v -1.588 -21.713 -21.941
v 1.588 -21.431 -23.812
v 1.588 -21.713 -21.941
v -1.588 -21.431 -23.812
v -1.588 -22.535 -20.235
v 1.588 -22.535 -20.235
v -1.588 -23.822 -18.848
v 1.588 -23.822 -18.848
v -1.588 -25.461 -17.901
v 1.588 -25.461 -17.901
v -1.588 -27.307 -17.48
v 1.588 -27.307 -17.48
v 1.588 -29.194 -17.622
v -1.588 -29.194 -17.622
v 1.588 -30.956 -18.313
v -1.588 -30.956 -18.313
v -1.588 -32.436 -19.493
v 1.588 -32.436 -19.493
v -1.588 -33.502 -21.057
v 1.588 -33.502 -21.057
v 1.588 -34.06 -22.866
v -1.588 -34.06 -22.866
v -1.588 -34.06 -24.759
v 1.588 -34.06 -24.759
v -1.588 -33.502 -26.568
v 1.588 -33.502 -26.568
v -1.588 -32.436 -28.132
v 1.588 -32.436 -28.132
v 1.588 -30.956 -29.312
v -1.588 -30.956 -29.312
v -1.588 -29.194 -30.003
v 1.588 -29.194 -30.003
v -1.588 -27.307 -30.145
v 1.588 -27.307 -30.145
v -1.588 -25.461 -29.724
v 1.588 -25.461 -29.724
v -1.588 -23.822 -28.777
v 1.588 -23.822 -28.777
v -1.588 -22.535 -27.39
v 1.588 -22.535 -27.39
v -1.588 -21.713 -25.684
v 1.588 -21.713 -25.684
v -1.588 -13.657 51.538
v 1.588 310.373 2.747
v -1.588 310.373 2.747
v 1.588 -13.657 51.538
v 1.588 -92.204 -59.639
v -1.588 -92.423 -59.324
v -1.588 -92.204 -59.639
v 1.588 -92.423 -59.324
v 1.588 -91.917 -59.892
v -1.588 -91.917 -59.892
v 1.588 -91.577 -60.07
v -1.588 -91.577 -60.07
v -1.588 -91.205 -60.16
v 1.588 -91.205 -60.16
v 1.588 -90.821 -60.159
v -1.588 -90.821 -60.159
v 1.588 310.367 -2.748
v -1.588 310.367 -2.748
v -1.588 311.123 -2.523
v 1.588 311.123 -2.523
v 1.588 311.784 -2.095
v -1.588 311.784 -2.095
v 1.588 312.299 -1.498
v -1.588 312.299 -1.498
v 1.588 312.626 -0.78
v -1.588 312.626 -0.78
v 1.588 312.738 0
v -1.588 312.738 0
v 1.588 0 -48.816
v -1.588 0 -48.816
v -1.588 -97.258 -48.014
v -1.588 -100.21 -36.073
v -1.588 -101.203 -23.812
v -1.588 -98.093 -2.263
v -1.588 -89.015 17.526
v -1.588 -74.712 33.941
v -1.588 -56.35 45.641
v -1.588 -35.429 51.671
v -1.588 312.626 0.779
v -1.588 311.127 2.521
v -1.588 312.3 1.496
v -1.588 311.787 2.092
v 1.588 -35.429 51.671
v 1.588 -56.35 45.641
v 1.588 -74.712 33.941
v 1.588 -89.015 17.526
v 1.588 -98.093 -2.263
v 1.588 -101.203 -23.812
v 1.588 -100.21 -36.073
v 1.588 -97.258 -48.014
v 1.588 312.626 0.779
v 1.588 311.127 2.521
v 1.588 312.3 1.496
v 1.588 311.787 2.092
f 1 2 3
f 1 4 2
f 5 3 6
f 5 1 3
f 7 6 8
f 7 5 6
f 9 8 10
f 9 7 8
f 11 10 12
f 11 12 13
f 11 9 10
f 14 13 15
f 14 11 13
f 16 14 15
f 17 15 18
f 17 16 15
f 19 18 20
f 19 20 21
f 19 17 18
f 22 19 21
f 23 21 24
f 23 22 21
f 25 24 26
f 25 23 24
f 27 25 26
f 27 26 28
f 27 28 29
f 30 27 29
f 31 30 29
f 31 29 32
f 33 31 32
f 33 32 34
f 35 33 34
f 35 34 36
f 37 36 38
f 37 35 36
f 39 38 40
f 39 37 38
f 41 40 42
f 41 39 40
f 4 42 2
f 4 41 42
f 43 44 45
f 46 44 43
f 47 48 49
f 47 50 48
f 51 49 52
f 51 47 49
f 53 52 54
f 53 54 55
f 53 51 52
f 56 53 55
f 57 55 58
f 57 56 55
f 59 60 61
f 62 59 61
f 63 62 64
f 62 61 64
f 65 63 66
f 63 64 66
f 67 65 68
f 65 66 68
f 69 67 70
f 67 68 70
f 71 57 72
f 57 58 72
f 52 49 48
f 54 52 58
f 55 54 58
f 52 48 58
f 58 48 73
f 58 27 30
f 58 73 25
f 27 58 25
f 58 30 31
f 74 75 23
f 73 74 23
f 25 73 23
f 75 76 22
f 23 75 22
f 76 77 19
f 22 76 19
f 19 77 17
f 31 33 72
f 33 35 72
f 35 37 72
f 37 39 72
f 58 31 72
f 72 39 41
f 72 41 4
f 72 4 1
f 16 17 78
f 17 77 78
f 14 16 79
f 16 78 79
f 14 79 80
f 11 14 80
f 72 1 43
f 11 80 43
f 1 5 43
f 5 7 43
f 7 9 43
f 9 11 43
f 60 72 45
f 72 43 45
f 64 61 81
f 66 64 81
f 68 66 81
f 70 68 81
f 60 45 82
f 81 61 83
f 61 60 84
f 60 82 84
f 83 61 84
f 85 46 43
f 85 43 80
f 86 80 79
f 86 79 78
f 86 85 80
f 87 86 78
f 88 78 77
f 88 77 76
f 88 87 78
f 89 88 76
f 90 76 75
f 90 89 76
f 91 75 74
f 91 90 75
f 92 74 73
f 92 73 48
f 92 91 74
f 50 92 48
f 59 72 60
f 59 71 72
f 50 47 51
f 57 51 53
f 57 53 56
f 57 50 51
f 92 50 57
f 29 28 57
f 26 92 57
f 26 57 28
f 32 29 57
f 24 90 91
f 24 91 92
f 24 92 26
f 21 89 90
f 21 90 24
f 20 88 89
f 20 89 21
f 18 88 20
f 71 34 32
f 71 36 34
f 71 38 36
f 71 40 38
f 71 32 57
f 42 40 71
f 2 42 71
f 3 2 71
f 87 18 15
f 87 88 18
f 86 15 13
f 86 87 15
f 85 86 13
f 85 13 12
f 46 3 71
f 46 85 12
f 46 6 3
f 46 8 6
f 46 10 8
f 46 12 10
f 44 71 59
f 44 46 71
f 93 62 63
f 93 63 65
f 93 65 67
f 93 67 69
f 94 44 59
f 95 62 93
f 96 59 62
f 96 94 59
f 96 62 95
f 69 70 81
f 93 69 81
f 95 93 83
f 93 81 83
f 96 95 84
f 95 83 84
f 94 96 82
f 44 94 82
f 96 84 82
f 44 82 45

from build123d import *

# Parameters (mm, degrees)
F0_R     = 6.35
F1_DEPTH = 1.5875
F2_R     = 1.5875


with BuildPart() as f1:
    # F0 (on Right) → F1 (new body, symmetric)
    with BuildSketch(Plane.YZ):
        with BuildLine():
            ThreePointArc((51.196875, -23.8125), (32.7506622905, 25.8960511115), (-13.6571946485, 51.5380797221))
            ThreePointArc((-13.6571946485, 51.5380797221), (-74.7116761115, 33.9412872905), (-101.203125, -23.8125))
            ThreePointArc((-101.203125, -23.8125), (-98.8413616364, -42.6368143416), (-91.9024738075, -60.2942369259))
            Line((-91.9024738075, -60.2942369259), (0, -48.815625))
            Line((0, -48.815625), (0, -23.415625))
            Line((0, -23.415625), (3.175, -23.415625))
            Line((3.175, -23.415625), (3.175, -48.3443618613))
            Line((3.175, -48.3443618613), (49.1093522758, -41.5263564983))
            ThreePointArc((49.1093522758, -41.5263564983), (50.6731948379, -32.730718196), (51.196875, -23.8125))
        make_face()
        with Locations((-27.78125, -23.8125)):
            Circle(F0_R, mode=Mode.SUBTRACT)
        with BuildLine():
            ThreePointArc((310.3672615954, -2.7480187483), (307.1812515299, 0.0029156046), (310.3730287107, 2.7471565524))
            Line((310.3730287107, 2.7471565524), (-13.6571946485, 51.5380797221))
            ThreePointArc((-13.6571946485, 51.5380797221), (32.7506622905, 25.8960511115), (51.196875, -23.8125))
            ThreePointArc((51.196875, -23.8125), (50.6731948379, -32.730718196), (49.1093522758, -41.5263564983))
            Line((49.1093522758, -41.5263564983), (310.3672615954, -2.7480187483))
        make_face()
        with BuildLine():
            ThreePointArc((310.3672615954, -2.7480187483), (312.0630786939, -1.8144997338), (312.7375, 0))
            ThreePointArc((312.7375, 0), (312.0649818283, 1.8122909259), (310.3730287107, 2.7471565524))
            ThreePointArc((310.3730287107, 2.7471565524), (307.1812515299, 0.0029156046), (310.3672615954, -2.7480187483))
        make_face()
        Polygon((0, -48.815625), (3.175, -48.3443618613), (3.175, -23.415625), (0, -23.415625), align=None)
    extrude(amount=F1_DEPTH, both=True)

    # F2
    f2_edges = [f1.edges().sort_by_distance(p)[0] for p in [
        (0, -91.902474, -60.294237),
    ]]
    fillet(f2_edges, radius=F2_R)


solid = f1.part
